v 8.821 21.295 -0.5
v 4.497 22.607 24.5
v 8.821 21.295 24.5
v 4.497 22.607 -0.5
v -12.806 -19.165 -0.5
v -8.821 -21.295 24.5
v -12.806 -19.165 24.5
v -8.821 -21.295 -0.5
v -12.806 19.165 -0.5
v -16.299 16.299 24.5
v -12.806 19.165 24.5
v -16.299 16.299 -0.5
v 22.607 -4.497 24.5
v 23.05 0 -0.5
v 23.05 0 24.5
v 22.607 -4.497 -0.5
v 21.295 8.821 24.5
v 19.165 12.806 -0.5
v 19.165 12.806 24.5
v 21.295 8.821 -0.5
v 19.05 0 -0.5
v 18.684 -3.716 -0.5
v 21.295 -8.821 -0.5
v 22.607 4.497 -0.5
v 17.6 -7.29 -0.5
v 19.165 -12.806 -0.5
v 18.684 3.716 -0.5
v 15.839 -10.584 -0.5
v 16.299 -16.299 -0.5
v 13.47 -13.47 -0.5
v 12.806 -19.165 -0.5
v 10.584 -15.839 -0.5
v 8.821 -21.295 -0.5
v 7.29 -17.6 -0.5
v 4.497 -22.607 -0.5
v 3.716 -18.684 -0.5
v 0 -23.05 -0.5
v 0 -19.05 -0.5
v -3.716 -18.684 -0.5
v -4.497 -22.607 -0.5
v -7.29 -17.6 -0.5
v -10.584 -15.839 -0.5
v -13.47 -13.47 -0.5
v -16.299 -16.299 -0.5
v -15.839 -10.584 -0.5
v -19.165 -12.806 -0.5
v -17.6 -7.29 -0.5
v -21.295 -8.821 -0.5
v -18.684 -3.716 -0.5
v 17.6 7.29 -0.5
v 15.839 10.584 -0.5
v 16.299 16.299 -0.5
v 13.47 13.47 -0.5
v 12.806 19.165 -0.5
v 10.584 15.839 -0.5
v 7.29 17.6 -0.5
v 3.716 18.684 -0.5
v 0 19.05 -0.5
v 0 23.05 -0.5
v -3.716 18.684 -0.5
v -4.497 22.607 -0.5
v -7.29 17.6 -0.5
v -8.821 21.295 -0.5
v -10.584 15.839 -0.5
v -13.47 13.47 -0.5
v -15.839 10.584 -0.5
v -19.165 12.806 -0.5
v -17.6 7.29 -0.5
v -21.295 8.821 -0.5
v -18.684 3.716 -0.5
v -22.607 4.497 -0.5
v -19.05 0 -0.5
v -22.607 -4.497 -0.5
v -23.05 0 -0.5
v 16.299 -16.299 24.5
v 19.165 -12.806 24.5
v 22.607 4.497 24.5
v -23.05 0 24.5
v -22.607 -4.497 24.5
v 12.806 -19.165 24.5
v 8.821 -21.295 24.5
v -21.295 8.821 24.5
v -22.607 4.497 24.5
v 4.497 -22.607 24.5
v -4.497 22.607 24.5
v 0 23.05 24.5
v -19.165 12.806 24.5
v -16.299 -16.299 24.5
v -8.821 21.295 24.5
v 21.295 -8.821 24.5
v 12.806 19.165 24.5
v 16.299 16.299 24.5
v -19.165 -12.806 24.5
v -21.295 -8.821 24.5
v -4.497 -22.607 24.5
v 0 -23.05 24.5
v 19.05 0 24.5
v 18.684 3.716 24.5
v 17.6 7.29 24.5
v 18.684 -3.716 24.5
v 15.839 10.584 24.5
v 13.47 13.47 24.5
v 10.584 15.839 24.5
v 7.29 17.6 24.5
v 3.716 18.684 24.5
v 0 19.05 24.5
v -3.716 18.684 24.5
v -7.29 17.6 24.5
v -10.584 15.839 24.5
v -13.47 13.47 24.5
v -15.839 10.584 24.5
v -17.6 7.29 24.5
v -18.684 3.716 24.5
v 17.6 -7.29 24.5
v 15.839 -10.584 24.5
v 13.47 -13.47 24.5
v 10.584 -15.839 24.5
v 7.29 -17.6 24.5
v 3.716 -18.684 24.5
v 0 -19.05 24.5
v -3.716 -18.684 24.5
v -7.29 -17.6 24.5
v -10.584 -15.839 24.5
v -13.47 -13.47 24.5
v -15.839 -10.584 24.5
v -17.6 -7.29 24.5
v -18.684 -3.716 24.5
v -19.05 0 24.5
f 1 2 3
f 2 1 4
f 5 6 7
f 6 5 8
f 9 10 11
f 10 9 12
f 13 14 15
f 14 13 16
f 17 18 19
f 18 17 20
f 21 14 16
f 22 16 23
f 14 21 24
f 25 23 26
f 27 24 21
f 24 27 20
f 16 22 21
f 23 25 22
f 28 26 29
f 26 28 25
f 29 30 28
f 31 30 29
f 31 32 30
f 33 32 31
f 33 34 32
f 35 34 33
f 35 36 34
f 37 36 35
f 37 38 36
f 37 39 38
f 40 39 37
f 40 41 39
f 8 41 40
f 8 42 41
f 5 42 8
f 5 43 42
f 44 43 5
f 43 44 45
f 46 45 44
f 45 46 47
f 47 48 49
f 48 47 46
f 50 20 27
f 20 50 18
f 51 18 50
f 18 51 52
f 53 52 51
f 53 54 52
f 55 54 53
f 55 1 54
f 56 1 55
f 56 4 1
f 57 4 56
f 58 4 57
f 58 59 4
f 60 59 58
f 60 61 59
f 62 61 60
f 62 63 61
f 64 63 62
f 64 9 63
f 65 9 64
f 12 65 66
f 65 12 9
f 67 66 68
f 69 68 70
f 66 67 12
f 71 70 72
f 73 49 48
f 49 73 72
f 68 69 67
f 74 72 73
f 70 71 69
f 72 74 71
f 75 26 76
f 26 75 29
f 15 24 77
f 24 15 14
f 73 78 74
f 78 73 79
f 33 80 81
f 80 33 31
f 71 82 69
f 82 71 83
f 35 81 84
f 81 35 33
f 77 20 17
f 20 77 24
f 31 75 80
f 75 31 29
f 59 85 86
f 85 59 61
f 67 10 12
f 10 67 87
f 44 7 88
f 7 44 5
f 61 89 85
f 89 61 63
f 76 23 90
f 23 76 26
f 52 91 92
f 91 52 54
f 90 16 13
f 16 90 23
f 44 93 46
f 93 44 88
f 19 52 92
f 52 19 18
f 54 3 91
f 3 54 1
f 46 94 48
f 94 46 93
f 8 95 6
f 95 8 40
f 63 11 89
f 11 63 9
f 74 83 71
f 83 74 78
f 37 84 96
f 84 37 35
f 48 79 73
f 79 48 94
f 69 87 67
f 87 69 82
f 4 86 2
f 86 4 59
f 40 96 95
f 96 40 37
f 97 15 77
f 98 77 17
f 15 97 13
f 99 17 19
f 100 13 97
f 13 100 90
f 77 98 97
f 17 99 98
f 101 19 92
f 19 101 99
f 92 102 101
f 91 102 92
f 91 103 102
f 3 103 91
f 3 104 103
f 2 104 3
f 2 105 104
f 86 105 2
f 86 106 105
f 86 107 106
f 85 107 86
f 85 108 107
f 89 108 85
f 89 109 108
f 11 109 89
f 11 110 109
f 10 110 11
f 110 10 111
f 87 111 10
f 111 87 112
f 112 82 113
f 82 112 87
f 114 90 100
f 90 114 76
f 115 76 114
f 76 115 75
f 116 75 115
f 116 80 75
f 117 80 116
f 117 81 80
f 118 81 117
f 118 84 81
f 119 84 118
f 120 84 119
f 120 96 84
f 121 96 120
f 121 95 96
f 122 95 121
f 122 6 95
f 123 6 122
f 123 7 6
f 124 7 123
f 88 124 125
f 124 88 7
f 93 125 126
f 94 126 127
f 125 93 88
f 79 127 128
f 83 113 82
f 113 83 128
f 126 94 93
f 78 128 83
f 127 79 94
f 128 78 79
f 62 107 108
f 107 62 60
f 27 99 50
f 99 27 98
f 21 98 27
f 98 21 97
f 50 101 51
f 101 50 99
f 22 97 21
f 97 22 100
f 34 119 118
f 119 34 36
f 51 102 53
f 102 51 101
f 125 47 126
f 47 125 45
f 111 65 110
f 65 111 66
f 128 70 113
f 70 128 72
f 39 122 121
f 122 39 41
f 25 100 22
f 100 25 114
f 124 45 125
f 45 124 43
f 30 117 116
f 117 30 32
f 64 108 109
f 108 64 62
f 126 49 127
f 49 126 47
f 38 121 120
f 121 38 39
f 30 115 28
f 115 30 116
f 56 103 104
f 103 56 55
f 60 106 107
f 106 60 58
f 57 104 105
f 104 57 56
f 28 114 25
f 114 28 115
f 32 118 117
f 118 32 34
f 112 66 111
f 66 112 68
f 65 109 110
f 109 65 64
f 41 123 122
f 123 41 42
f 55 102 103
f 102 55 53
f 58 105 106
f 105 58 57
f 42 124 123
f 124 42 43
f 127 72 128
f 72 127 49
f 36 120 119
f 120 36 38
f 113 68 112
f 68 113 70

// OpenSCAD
$fn = 32;

// ----------------------------------------------------------------------
// Two-module gear rim: z16 m2 and z24 m1.5, 24 mm wide
// ----------------------------------------------------------------------

// --- parameters (mm) ---
module_a = 2;             // first tooth module
teeth_a = 16;             // first band tooth count
module_b = 1.5;           // second tooth module
teeth_b = 24;             // second band tooth count
band_h = 10;              // height of one tooth band
web_t = 4;                // web thickness between the bands
total = 24;               // overall width over both bands
root_r = 13.5;            // root radius of the coarse band
hub_r = 23.05;            // hub radius
bore_d = 38.1;            // hub bore
hole_count = 4;           // lightening holes
hole_r = 9.86;            // lightening hole circle radius
hole_d = 4;               // lightening hole diameter

band_a = [[13.414, -1.521], [15.981, -1.553], [16.987, -1.192], [17.988, -0.666], [17.988, 0.666], [16.987, 1.192], [15.981, 1.553], [13.414, 1.521], [12.975, 3.728], [15.359, 4.681], [16.15, 5.399], [16.873, 6.269], [16.364, 7.498], [15.237, 7.602], [14.171, 7.551], [11.811, 6.538], [10.561, 8.41], [12.399, 10.202], [12.854, 11.168], [13.19, 12.249], [12.249, 13.19], [11.168, 12.854], [10.202, 12.399], [8.41, 10.561], [6.538, 11.811], [7.551, 14.171], [7.602, 15.237], [7.498, 16.364], [6.269, 16.873], [5.399, 16.15], [4.681, 15.359], [3.728, 12.975], [1.521, 13.414], [1.553, 15.981], [1.192, 16.987], [0.666, 17.988], [-0.666, 17.988], [-1.192, 16.987], [-1.553, 15.981], [-1.521, 13.414], [-3.728, 12.975], [-4.681, 15.359], [-5.399, 16.15], [-6.269, 16.873], [-7.498, 16.364], [-7.602, 15.237], [-7.551, 14.171], [-6.538, 11.811], [-8.41, 10.561], [-10.202, 12.399], [-11.168, 12.854], [-12.249, 13.19], [-13.19, 12.249], [-12.854, 11.168], [-12.399, 10.202], [-10.561, 8.41], [-11.811, 6.538], [-14.171, 7.551], [-15.237, 7.602], [-16.364, 7.498], [-16.873, 6.269], [-16.15, 5.399], [-15.359, 4.681], [-12.975, 3.728], [-13.414, 1.521], [-15.981, 1.553], [-16.987, 1.192], [-17.988, 0.666], [-17.988, -0.666], [-16.987, -1.192], [-15.981, -1.553], [-13.414, -1.521], [-12.975, -3.728], [-15.359, -4.681], [-16.15, -5.399], [-16.873, -6.269], [-16.364, -7.498], [-15.237, -7.602], [-14.171, -7.551], [-11.811, -6.538], [-10.561, -8.41], [-12.399, -10.202], [-12.854, -11.168], [-13.19, -12.249], [-12.249, -13.19], [-11.168, -12.854], [-10.202, -12.399], [-8.41, -10.561], [-6.538, -11.811], [-7.551, -14.171], [-7.602, -15.237], [-7.498, -16.364], [-6.269, -16.873], [-5.399, -16.15], [-4.681, -15.359], [-3.728, -12.975], [-1.521, -13.414], [-1.553, -15.981], [-1.192, -16.987], [-0.666, -17.988], [0.666, -17.988], [1.192, -16.987], [1.553, -15.981], [1.521, -13.414], [3.728, -12.975], [4.681, -15.359], [5.399, -16.15], [6.269, -16.873], [7.498, -16.364], [7.602, -15.237], [7.551, -14.171], [6.538, -11.811], [8.41, -10.561], [10.202, -12.399], [11.168, -12.854], [12.249, -13.19], [13.19, -12.249], [12.854, -11.168], [12.399, -10.202], [10.561, -8.41], [11.811, -6.538], [14.171, -7.551], [15.237, -7.602], [16.364, -7.498], [16.873, -6.269], [16.15, -5.399], [15.359, -4.681], [12.975, -3.728]];
band_b = [[16.073, -1.292], [17.767, -1.23], [18.631, -0.943], [19.493, -0.537], [19.493, 0.537], [18.631, 0.943], [17.767, 1.23], [16.073, 1.292], [15.86, 2.912], [17.48, 3.41], [18.24, 3.911], [18.967, 4.527], [18.69, 5.563], [17.752, 5.733], [16.843, 5.787], [15.191, 5.408], [14.566, 6.918], [16.002, 7.818], [16.607, 8.499], [17.149, 9.282], [16.613, 10.211], [15.663, 10.132], [14.772, 9.949], [13.274, 9.155], [12.279, 10.452], [13.433, 11.693], [13.841, 12.507], [14.163, 13.404], [13.404, 14.163], [12.507, 13.841], [11.693, 13.433], [10.452, 12.279], [9.155, 13.274], [9.949, 14.772], [10.132, 15.663], [10.211, 16.613], [9.282, 17.149], [8.499, 16.607], [7.818, 16.002], [6.918, 14.566], [5.408, 15.191], [5.787, 16.843], [5.733, 17.752], [5.563, 18.69], [4.527, 18.967], [3.911, 18.24], [3.41, 17.48], [2.912, 15.86], [1.292, 16.073], [1.23, 17.767], [0.943, 18.631], [0.537, 19.493], [-0.537, 19.493], [-0.943, 18.631], [-1.23, 17.767], [-1.292, 16.073], [-2.912, 15.86], [-3.41, 17.48], [-3.911, 18.24], [-4.527, 18.967], [-5.563, 18.69], [-5.733, 17.752], [-5.787, 16.843], [-5.408, 15.191], [-6.918, 14.566], [-7.818, 16.002], [-8.499, 16.607], [-9.282, 17.149], [-10.211, 16.613], [-10.132, 15.663], [-9.949, 14.772], [-9.155, 13.274], [-10.452, 12.279], [-11.693, 13.433], [-12.507, 13.841], [-13.404, 14.163], [-14.163, 13.404], [-13.841, 12.507], [-13.433, 11.693], [-12.279, 10.452], [-13.274, 9.155], [-14.772, 9.949], [-15.663, 10.132], [-16.613, 10.211], [-17.149, 9.282], [-16.607, 8.499], [-16.002, 7.818], [-14.566, 6.918], [-15.191, 5.408], [-16.843, 5.787], [-17.752, 5.733], [-18.69, 5.563], [-18.967, 4.527], [-18.24, 3.911], [-17.48, 3.41], [-15.86, 2.912], [-16.073, 1.292], [-17.767, 1.23], [-18.631, 0.943], [-19.493, 0.537], [-19.493, -0.537], [-18.631, -0.943], [-17.767, -1.23], [-16.073, -1.292], [-15.86, -2.912], [-17.48, -3.41], [-18.24, -3.911], [-18.967, -4.527], [-18.69, -5.563], [-17.752, -5.733], [-16.843, -5.787], [-15.191, -5.408], [-14.566, -6.918], [-16.002, -7.818], [-16.607, -8.499], [-17.149, -9.282], [-16.613, -10.211], [-15.663, -10.132], [-14.772, -9.949], [-13.274, -9.155], [-12.279, -10.452], [-13.433, -11.693], [-13.841, -12.507], [-14.163, -13.404], [-13.404, -14.163], [-12.507, -13.841], [-11.693, -13.433], [-10.452, -12.279], [-9.155, -13.274], [-9.949, -14.772], [-10.132, -15.663], [-10.211, -16.613], [-9.282, -17.149], [-8.499, -16.607], [-7.818, -16.002], [-6.918, -14.566], [-5.408, -15.191], [-5.787, -16.843], [-5.733, -17.752], [-5.563, -18.69], [-4.527, -18.967], [-3.911, -18.24], [-3.41, -17.48], [-2.912, -15.86], [-1.292, -16.073], [-1.23, -17.767], [-0.943, -18.631], [-0.537, -19.493], [0.537, -19.493], [0.943, -18.631], [1.23, -17.767], [1.292, -16.073], [2.912, -15.86], [3.41, -17.48], [3.911, -18.24], [4.527, -18.967], [5.563, -18.69], [5.733, -17.752], [5.787, -16.843], [5.408, -15.191], [6.918, -14.566], [7.818, -16.002], [8.499, -16.607], [9.282, -17.149], [10.211, -16.613], [10.132, -15.663], [9.949, -14.772], [9.155, -13.274], [10.452, -12.279], [11.693, -13.433], [12.507, -13.841], [13.404, -14.163], [14.163, -13.404], [13.841, -12.507], [13.433, -11.693], [12.279, -10.452], [13.274, -9.155], [14.772, -9.949], [15.663, -10.132], [16.613, -10.211], [17.149, -9.282], [16.607, -8.499], [16.002, -7.818], [14.566, -6.918], [15.191, -5.408], [16.843, -5.787], [17.752, -5.733], [18.69, -5.563], [18.967, -4.527], [18.24, -3.911], [17.48, -3.41], [15.86, -2.912]];

difference() {
  union() {
    /* tooth band A, overlapping the web by 0.4 mm */
    linear_extrude(height = band_h + 0.4) polygon(band_a);
    /* web */
    translate([0, 0, band_h - 0.4]) cylinder(h = web_t + 0.8, d = 2 * root_r);
    /* tooth band B */
    translate([0, 0, band_h + web_t]) linear_extrude(height = band_h + 0.4) polygon(band_b);
    /* hub */
    translate([0, 0, -0.5]) cylinder(h = total + 1.0, d = 2 * hub_r);
  }
  /* bore */
  translate([0, 0, -2.5]) cylinder(h = total + 5, d = bore_d);
  /* lightening holes through the web */
  for (i = [0 : hole_count - 1]) {
    a = i * 360 / hole_count;
    translate([hole_r * cos(a), hole_r * sin(a), -2.5]) cylinder(h = total + 5, d = hole_d);
  }
}
